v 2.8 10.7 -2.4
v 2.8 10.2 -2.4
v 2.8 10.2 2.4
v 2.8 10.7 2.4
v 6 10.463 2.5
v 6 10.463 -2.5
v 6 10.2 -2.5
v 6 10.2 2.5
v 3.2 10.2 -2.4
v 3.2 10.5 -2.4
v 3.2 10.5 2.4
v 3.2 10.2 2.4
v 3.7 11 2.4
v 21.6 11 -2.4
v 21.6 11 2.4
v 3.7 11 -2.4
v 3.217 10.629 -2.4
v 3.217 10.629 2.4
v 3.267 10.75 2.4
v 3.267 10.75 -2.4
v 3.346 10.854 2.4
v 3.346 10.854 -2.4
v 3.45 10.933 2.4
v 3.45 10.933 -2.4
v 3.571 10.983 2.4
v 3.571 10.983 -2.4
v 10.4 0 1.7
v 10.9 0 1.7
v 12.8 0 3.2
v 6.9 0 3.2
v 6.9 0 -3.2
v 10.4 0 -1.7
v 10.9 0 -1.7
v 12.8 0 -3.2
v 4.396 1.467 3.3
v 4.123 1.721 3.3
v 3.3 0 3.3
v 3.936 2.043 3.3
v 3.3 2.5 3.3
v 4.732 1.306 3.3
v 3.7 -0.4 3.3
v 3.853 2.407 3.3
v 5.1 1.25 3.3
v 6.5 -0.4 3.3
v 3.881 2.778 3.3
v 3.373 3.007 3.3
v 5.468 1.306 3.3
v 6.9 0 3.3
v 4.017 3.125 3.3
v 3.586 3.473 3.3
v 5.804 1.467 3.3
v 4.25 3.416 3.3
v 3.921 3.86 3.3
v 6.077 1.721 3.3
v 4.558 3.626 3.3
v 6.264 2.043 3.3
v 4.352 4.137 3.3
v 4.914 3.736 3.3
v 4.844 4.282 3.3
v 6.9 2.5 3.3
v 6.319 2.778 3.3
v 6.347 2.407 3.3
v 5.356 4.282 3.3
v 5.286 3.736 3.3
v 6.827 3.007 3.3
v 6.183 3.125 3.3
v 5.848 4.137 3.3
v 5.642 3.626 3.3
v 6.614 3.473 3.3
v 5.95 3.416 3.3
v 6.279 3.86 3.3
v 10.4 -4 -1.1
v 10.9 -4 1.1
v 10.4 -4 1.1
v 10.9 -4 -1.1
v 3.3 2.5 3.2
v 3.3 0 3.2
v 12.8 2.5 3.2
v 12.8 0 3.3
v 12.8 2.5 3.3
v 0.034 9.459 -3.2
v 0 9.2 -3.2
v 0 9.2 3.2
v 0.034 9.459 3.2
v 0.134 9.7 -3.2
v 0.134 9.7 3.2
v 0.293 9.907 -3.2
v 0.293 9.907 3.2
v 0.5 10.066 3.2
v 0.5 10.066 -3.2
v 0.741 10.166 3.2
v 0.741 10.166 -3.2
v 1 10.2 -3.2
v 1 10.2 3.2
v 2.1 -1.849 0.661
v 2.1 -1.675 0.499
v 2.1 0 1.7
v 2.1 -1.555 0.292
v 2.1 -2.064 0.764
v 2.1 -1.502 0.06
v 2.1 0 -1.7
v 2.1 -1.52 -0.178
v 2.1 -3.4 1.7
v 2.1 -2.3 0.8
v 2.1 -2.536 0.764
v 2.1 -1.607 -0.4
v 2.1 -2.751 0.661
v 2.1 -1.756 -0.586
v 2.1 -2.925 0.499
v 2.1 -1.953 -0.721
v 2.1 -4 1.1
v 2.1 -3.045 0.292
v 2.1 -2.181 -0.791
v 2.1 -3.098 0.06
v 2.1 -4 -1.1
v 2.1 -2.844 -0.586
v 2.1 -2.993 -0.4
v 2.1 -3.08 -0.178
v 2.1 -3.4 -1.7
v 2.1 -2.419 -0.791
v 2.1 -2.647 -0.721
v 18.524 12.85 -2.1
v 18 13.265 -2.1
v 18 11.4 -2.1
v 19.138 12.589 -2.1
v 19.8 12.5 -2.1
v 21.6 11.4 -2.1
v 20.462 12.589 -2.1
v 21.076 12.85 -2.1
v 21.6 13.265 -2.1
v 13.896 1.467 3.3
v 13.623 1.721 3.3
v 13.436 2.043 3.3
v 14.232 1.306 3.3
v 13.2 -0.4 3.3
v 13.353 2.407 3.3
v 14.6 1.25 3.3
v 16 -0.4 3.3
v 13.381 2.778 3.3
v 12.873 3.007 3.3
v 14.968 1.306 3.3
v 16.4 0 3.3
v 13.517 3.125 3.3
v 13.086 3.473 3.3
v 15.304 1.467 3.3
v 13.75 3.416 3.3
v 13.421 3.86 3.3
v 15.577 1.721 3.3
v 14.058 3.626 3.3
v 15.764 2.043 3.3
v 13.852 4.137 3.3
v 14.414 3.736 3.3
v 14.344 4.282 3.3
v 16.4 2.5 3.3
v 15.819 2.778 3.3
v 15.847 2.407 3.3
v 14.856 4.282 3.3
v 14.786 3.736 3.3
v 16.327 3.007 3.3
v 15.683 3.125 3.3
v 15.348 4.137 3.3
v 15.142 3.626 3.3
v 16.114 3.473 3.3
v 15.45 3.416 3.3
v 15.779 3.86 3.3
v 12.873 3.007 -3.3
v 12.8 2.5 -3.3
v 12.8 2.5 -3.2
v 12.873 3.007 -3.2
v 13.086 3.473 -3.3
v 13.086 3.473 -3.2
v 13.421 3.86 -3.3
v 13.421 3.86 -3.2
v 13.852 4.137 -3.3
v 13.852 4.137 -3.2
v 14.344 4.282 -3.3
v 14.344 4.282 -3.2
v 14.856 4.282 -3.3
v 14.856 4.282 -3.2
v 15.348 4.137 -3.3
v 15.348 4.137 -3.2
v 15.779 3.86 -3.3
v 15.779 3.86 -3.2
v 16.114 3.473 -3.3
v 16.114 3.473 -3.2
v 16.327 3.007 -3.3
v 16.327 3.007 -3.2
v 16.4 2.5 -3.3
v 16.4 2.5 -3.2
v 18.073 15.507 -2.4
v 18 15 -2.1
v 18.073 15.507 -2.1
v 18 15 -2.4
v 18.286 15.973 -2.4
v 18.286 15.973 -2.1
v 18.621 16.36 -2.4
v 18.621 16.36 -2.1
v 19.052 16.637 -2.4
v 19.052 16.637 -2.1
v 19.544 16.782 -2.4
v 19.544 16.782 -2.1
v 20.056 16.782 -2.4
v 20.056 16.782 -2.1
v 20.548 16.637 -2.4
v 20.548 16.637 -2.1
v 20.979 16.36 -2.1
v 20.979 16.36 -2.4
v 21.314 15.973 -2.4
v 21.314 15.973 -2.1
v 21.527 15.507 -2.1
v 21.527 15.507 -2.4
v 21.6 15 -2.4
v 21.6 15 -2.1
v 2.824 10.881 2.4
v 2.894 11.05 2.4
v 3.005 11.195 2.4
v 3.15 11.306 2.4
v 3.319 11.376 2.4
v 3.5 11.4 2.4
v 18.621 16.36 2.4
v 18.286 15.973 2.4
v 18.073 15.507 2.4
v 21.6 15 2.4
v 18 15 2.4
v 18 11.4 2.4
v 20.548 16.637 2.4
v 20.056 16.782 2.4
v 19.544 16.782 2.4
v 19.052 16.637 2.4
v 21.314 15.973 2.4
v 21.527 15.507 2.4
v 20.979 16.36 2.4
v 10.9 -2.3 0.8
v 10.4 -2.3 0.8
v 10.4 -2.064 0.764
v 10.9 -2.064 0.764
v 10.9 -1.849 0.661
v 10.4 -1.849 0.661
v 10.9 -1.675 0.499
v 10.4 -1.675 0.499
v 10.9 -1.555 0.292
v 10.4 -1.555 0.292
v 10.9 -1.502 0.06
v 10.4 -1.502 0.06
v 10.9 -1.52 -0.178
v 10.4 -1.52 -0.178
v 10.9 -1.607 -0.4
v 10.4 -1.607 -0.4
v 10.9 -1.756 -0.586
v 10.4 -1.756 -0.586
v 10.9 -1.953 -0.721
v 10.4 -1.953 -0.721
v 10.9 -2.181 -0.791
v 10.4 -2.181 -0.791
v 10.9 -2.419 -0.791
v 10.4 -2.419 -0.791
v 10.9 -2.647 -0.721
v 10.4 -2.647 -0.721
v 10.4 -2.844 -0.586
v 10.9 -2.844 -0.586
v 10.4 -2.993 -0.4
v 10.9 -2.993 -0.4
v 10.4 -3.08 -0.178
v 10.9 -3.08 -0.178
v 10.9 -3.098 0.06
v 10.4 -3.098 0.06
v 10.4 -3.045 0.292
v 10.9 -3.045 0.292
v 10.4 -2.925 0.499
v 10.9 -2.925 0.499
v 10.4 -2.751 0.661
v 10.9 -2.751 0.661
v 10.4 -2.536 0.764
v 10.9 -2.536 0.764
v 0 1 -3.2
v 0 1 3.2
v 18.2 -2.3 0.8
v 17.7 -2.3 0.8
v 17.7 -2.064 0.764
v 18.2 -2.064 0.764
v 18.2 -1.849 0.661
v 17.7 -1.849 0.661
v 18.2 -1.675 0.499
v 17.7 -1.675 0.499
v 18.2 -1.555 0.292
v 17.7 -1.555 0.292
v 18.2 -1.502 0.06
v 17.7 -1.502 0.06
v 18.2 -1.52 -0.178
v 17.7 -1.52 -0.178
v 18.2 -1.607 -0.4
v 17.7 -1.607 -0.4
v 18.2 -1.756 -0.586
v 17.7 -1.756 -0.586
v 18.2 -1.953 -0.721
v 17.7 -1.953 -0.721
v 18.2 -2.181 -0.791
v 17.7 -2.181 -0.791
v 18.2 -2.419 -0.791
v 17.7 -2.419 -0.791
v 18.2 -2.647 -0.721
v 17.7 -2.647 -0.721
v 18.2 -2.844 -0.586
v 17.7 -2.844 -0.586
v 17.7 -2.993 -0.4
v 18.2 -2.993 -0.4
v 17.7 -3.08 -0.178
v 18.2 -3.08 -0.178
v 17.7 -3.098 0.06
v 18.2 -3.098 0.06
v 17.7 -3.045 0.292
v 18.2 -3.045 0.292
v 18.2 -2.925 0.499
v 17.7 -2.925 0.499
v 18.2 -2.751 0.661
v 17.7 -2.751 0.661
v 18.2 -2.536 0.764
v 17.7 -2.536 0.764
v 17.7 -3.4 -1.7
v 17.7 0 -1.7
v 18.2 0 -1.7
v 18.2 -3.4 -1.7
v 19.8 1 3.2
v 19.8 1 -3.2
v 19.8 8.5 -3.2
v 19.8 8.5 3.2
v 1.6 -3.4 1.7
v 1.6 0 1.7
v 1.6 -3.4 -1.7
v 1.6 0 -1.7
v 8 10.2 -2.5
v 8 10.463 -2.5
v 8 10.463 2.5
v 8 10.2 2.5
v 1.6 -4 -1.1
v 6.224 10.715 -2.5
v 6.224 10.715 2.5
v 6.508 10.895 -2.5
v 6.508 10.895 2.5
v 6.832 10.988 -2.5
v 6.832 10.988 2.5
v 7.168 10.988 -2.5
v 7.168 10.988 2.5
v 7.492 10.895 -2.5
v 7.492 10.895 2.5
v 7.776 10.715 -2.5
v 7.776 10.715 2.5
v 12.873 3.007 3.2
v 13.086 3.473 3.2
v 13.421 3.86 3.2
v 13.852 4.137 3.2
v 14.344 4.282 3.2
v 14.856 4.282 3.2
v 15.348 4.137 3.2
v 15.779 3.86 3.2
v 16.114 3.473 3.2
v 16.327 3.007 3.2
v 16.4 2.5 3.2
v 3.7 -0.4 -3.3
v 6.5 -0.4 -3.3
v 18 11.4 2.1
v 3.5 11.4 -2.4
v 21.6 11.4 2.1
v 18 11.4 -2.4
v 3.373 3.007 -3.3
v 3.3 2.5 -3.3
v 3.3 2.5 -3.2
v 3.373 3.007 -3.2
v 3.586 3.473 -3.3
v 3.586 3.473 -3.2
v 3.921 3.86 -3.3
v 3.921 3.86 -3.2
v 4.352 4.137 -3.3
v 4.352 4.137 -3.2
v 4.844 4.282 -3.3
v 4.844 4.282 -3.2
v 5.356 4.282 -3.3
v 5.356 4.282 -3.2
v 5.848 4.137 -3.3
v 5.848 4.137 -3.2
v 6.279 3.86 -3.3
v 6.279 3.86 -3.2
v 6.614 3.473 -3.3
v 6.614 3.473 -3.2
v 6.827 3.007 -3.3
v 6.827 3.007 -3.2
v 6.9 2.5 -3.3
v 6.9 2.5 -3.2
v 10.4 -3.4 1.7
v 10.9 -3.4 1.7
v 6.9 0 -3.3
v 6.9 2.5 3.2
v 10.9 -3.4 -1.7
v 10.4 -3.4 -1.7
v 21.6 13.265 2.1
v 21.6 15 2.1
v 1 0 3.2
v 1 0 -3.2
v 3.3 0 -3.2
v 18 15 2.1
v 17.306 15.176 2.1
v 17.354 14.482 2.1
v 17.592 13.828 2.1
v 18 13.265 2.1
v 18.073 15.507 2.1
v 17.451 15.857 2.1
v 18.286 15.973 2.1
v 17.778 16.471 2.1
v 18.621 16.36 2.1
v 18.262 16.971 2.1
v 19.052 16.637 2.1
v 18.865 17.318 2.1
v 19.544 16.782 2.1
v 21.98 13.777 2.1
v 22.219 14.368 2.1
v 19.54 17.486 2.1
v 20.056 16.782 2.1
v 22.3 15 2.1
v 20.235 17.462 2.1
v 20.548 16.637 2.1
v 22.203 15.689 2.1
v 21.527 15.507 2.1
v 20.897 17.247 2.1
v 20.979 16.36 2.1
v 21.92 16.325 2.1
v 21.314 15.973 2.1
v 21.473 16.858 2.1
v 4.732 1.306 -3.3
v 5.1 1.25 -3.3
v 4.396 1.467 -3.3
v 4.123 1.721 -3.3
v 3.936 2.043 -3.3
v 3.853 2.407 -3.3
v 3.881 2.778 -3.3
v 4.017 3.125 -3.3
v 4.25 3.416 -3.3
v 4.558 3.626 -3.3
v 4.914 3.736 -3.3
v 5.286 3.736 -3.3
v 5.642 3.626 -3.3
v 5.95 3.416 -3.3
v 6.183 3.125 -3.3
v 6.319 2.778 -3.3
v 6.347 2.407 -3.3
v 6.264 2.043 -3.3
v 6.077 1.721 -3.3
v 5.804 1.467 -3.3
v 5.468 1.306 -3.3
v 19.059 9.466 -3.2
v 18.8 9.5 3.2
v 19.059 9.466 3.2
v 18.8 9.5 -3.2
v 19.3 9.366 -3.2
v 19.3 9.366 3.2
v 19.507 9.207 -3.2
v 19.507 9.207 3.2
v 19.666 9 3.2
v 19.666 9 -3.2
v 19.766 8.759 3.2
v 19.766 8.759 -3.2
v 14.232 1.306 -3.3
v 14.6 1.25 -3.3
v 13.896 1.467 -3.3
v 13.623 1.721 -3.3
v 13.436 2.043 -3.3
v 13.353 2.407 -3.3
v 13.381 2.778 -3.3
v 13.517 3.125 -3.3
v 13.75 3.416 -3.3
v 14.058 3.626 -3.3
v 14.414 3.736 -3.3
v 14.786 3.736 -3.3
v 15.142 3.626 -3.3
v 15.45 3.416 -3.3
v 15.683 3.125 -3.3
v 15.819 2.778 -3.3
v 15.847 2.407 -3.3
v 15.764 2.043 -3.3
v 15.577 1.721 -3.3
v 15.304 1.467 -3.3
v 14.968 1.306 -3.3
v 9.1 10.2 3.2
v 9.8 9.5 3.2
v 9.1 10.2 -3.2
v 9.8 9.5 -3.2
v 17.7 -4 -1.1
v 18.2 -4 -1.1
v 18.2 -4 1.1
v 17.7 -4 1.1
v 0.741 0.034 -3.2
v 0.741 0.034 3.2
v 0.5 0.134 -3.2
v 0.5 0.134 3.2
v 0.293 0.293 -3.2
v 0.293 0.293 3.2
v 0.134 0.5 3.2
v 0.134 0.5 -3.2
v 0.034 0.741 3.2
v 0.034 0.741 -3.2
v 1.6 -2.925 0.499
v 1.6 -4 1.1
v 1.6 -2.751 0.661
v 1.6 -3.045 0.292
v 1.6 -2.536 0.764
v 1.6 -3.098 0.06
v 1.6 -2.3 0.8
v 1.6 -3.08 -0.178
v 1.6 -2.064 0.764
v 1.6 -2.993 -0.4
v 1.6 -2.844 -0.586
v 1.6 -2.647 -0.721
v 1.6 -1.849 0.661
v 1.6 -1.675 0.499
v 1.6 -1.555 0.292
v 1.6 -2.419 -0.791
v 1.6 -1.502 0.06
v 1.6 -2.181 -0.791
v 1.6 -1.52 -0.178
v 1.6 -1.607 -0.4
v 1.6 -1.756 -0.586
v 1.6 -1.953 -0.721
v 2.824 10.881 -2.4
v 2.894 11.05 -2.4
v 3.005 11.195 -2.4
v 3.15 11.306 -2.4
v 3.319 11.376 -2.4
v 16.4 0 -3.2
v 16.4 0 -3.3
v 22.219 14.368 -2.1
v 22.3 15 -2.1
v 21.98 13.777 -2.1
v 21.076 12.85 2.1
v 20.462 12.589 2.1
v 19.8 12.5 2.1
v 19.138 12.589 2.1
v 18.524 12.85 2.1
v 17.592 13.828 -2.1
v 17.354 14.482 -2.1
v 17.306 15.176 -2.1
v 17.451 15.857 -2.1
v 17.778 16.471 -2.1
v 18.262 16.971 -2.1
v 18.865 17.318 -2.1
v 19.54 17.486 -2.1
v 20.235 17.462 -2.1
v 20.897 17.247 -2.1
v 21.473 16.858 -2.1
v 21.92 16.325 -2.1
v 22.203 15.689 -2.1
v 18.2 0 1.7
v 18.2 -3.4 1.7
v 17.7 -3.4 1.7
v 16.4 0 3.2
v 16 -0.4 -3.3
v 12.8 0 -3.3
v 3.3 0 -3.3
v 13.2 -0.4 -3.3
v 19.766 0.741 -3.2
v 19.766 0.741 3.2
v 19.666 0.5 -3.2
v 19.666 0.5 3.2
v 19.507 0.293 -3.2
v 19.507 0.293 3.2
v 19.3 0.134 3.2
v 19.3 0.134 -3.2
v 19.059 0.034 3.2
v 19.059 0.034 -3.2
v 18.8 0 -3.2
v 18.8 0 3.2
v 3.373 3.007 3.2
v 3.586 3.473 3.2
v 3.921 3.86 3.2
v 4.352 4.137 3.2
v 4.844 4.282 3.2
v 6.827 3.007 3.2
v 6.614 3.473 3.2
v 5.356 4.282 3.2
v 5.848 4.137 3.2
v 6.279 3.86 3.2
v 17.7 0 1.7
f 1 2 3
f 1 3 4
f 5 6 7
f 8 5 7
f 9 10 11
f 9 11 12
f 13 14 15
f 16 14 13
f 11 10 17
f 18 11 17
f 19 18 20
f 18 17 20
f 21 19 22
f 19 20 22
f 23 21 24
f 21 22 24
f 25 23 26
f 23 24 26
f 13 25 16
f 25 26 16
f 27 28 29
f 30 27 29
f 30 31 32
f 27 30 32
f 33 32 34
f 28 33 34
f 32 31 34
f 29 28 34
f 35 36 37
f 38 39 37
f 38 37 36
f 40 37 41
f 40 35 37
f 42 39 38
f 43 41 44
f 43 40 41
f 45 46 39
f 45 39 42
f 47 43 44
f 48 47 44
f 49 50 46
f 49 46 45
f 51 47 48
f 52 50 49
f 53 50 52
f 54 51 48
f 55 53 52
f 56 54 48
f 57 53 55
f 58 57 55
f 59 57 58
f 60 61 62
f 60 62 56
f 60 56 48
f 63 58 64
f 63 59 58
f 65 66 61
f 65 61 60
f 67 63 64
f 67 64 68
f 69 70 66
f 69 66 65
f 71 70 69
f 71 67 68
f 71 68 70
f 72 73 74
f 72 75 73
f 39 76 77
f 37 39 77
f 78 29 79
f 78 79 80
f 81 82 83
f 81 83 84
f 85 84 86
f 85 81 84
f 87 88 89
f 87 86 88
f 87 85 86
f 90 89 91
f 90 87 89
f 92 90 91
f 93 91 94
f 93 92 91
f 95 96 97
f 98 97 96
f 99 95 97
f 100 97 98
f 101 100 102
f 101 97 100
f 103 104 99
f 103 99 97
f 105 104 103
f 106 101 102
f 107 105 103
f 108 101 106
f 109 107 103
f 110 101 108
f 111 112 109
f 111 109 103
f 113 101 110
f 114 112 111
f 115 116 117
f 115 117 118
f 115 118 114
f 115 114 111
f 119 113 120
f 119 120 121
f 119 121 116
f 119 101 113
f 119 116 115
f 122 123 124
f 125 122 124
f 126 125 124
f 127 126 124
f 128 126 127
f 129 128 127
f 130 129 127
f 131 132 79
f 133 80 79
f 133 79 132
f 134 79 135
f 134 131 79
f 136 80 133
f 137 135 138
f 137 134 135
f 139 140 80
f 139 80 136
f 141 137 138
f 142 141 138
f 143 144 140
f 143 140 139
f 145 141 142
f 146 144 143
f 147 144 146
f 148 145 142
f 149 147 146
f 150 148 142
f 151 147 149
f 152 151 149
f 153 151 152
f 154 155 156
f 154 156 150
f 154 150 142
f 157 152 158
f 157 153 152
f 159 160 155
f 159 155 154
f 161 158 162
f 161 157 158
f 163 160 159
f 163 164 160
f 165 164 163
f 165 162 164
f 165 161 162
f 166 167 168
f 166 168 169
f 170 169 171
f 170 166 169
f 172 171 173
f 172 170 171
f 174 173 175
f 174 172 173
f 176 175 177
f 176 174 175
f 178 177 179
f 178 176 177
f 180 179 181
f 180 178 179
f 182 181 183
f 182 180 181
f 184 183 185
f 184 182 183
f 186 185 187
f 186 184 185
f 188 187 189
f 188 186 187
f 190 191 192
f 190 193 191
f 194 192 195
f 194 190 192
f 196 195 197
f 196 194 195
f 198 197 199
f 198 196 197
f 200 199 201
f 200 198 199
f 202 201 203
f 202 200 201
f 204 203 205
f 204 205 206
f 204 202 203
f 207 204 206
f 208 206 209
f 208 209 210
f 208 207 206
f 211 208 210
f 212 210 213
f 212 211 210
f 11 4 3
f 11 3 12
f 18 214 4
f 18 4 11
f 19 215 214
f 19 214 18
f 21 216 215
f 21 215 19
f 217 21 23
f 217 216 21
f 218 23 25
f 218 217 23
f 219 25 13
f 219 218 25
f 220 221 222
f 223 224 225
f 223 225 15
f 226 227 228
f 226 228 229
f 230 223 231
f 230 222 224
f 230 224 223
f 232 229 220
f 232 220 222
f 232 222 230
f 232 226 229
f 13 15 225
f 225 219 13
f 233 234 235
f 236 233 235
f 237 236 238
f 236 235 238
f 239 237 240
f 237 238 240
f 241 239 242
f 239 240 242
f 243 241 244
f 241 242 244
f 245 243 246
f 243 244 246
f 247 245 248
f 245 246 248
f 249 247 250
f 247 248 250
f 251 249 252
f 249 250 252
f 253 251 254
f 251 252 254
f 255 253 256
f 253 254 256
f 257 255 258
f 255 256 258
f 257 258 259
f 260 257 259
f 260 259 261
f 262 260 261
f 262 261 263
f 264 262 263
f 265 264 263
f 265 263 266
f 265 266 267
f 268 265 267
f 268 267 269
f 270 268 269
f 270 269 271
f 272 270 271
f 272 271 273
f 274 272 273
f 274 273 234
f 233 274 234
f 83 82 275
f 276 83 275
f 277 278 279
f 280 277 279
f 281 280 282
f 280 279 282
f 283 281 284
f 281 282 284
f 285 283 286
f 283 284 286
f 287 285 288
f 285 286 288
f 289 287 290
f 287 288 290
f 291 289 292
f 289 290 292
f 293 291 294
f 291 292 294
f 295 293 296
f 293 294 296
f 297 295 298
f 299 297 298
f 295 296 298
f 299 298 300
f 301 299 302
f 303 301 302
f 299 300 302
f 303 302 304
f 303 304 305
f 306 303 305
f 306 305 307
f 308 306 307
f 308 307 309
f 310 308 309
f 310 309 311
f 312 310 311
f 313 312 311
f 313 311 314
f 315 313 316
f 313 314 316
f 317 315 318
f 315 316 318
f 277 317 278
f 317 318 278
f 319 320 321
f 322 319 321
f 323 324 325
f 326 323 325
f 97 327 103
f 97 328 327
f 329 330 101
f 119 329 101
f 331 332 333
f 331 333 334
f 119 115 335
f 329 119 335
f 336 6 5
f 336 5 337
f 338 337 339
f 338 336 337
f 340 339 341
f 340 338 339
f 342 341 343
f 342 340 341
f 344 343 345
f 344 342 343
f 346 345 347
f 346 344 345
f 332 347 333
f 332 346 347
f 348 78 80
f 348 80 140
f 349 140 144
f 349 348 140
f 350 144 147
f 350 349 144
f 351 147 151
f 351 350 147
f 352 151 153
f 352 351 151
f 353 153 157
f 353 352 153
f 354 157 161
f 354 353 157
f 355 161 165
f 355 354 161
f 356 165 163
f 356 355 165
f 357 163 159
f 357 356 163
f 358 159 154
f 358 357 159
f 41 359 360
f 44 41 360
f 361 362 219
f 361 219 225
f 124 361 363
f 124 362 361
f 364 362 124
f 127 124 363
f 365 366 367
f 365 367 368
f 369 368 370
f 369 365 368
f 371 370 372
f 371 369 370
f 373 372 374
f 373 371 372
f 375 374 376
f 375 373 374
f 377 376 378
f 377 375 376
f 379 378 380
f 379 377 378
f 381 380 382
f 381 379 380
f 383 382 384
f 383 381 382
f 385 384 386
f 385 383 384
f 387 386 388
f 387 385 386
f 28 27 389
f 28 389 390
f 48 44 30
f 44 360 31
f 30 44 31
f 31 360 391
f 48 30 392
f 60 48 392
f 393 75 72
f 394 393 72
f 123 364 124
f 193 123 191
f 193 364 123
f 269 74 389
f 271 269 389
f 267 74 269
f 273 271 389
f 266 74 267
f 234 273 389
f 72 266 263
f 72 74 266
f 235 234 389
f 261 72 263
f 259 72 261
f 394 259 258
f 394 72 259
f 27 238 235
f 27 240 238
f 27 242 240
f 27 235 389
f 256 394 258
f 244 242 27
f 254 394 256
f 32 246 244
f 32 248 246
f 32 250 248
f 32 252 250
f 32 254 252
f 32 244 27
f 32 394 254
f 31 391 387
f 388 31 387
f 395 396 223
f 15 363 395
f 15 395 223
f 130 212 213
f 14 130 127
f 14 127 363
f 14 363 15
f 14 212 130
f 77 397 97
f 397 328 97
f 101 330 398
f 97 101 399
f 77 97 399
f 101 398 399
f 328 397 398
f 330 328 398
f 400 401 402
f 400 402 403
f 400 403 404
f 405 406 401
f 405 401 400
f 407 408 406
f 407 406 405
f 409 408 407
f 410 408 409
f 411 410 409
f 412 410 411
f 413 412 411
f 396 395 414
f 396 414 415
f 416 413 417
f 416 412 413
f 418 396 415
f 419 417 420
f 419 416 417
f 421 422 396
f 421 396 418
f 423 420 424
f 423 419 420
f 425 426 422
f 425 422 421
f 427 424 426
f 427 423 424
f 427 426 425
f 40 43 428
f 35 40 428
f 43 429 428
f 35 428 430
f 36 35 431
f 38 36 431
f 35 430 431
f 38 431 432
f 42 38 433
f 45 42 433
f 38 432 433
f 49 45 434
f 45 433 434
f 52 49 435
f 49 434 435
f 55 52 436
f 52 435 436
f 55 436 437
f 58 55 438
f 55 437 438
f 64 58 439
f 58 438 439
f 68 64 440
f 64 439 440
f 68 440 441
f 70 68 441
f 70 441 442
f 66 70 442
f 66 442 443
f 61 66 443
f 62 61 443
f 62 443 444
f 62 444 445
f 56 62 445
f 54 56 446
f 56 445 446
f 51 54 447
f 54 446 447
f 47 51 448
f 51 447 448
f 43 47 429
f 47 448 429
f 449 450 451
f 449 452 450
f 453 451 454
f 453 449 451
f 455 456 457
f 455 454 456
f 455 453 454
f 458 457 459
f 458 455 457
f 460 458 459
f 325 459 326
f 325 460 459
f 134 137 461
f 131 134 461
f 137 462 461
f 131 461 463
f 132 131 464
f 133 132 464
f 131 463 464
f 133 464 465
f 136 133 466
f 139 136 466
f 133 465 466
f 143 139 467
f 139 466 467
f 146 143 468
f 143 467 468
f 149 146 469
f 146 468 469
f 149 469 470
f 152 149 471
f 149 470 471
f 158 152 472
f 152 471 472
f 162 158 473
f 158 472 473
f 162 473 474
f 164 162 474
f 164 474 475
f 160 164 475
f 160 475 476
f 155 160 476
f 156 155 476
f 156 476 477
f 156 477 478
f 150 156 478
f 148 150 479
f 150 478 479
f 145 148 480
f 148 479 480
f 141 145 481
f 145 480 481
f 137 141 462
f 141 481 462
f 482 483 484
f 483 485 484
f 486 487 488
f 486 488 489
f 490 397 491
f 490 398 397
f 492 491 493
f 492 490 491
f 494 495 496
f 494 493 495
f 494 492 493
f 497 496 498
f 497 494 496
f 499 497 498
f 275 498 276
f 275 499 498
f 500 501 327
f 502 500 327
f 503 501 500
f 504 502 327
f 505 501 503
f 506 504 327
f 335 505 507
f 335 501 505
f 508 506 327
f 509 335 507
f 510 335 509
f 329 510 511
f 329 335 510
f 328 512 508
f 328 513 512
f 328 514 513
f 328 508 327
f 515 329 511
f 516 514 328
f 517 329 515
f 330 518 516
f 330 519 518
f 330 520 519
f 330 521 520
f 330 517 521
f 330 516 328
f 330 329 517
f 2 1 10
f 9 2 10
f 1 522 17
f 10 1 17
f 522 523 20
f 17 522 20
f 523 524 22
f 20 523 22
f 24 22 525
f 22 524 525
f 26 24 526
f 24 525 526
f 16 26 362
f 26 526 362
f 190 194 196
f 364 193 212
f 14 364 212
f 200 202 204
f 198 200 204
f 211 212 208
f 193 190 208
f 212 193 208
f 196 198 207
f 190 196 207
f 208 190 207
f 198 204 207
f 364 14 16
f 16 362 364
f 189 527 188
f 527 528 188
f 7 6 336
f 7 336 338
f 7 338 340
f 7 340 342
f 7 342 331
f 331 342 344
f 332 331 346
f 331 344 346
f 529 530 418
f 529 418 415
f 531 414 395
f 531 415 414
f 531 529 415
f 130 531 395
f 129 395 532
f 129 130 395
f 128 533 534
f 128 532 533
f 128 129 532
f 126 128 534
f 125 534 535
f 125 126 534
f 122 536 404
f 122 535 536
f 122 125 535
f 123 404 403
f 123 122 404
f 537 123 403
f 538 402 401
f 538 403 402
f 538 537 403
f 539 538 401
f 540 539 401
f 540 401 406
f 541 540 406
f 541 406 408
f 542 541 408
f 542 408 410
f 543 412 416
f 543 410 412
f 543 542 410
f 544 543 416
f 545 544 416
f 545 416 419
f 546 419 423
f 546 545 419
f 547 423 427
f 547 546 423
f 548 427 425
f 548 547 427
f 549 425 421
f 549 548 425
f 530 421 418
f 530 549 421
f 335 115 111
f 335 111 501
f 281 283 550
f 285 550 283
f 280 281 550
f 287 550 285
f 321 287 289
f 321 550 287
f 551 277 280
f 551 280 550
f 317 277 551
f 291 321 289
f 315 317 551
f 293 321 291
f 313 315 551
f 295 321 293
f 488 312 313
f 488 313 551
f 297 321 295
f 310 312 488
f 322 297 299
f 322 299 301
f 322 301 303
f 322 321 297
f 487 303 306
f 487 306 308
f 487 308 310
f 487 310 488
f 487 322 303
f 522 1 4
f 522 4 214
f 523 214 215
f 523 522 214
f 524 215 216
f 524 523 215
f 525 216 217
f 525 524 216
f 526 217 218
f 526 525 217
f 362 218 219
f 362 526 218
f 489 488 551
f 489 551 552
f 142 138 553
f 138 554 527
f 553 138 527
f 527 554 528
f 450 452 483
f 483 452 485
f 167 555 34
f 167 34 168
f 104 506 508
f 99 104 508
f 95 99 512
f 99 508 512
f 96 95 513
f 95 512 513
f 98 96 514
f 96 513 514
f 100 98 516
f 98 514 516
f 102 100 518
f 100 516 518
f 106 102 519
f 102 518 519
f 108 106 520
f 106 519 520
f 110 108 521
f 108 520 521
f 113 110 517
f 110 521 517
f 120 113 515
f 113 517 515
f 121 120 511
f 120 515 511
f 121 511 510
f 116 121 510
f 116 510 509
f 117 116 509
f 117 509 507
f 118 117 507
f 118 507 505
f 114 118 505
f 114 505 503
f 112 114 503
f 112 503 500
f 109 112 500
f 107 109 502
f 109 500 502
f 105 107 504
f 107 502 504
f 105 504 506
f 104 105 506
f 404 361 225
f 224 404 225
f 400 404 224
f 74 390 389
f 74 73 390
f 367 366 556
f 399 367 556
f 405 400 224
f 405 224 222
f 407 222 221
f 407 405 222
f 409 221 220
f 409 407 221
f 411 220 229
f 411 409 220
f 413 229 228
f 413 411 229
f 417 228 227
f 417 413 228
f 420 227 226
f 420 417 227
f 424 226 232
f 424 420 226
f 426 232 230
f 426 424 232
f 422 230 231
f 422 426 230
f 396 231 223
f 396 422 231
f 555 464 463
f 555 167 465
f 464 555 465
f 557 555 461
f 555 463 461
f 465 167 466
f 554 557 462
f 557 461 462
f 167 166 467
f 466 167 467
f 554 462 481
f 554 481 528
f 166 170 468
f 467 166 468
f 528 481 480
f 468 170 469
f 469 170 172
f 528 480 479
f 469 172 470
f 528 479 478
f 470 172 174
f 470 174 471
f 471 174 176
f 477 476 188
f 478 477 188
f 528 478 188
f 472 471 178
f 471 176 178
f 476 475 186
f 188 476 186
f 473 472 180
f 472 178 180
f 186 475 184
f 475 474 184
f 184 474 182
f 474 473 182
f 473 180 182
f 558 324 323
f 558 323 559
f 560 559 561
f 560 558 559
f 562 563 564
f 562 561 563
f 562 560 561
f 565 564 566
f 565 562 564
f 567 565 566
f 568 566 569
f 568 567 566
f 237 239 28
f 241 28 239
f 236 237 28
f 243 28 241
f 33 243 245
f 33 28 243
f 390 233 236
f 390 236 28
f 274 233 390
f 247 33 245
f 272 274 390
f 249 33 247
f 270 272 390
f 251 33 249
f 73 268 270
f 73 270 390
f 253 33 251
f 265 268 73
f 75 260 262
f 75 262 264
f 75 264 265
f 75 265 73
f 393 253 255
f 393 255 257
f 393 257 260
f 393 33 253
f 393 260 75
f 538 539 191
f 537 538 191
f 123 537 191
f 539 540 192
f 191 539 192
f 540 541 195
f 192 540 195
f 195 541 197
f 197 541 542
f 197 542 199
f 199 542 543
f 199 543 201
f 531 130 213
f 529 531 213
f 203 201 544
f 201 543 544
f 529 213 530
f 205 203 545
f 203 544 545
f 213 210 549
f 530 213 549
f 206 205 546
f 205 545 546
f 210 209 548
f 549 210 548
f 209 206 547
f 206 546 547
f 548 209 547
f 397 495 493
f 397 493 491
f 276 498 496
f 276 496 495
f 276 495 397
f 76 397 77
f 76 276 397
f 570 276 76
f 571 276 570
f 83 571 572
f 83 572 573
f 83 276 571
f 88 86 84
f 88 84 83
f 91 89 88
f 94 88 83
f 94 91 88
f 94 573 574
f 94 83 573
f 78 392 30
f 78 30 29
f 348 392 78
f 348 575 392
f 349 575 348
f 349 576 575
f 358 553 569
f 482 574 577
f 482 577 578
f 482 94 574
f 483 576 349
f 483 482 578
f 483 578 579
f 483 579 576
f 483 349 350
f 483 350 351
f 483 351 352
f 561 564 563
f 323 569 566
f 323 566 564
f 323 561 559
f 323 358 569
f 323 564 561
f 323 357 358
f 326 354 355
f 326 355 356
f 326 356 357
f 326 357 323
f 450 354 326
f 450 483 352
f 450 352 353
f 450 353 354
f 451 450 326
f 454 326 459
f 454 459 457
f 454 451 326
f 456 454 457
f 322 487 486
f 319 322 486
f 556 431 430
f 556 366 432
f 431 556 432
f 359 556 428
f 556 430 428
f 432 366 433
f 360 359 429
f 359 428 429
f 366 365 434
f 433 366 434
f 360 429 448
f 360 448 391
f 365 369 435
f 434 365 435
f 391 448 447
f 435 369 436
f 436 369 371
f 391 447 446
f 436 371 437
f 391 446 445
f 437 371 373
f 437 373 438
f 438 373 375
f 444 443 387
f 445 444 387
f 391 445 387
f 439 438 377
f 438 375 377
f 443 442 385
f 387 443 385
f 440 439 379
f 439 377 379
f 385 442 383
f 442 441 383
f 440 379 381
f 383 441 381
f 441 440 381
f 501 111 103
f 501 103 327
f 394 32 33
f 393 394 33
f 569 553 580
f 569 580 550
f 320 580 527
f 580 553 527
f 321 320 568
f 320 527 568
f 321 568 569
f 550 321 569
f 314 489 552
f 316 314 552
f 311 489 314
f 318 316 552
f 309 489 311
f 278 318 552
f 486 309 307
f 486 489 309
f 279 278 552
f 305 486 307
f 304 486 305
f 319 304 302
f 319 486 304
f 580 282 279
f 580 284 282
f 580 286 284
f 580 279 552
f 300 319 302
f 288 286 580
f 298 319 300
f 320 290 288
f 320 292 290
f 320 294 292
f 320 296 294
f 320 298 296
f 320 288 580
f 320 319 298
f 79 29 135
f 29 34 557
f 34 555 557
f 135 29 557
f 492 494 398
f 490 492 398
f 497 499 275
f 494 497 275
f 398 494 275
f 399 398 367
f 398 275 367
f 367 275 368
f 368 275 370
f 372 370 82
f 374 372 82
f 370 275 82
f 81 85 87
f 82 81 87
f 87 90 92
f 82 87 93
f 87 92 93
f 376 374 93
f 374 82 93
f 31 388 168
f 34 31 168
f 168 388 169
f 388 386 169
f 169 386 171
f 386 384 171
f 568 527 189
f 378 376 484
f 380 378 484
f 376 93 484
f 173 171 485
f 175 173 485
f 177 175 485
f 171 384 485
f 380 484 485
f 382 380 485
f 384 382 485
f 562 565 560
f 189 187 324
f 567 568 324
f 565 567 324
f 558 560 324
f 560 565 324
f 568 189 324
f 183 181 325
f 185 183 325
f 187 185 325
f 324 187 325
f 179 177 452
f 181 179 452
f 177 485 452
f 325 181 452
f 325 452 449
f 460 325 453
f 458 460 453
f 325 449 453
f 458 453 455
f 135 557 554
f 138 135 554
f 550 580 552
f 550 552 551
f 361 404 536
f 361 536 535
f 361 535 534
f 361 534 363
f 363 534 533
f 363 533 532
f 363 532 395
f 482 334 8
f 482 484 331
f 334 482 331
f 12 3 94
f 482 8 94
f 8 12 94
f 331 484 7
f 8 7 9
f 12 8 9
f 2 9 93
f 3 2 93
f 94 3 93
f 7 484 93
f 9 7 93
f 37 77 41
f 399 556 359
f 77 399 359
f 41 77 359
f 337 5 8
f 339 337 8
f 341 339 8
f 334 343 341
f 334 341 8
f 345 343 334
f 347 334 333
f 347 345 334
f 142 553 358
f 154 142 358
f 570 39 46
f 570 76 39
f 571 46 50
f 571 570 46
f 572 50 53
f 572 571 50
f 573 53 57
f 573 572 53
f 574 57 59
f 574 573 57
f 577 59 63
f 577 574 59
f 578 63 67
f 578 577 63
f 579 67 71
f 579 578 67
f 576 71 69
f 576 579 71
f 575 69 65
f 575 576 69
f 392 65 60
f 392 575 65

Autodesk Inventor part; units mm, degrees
ref_plane "YZ Plane" through (0, 0, 0) normal (1, 0, 0) x (0, 1, 0)
ref_plane "XZ Plane" through (0, 0, 0) normal (0, 1, 0) x (-1, 0, 0)
ref_plane "XY Plane" through (0, 0, 0) normal (0, 0, 1) x (1, 0, 0)
sketch "Эскиз2" plane through (0, 0, 0) normal (0, 0, 1) x (1, 0, 0)
  line L0 (1, 0) -> (18.8, 0)
  line L1 (19.8, 1) -> (19.8, 8.5)
  line L2 (18.8, 9.5) -> (9.8, 9.5)
  line L3 (9.8, 9.5) -> (9.1, 10.2)
  line L4 (9.1, 10.2) -> (1, 10.2)
  line L5 (0, 9.2) -> (0, 1)
  arc A0 (1, 10.2) -> (0, 9.2) centre (1, 9.2) ccw
  arc A1 (0, 1) -> (1, 0) centre (1, 1) ccw
  arc A2 (18.8, 0) -> (19.8, 1) centre (18.8, 1) ccw
  arc A3 (19.8, 8.5) -> (18.8, 9.5) centre (18.8, 8.5) ccw
  point P0 (0, 0)
  point P1 (19.8, 0)
  point P2 (19.8, 9.5)
  dimension "d42" = 19.8
  dimension "d43" = 9.5
  dimension "d44" = 10
  dimension "d45" = 135
  dimension "d46" = 10.2
  dimension "d47" = 1
extrude "Выдавливание1" add sketch "Эскиз2" along normal mid plane 6.4
sketch "Эскиз3" plane through (0, 0, 0) normal (0, 0, 1) x (1, 0, 0)
  line L0 (1, 0) -> (18.8, 0) projected
  line L1 (1.6, 0) -> (2.1, 0)
  line L2 (2.1, 0) -> (2.1, -4)
  line L3 (2.1, -4) -> (1.6, -4)
  line L4 (1.6, -4) -> (1.6, 0)
  line L5 (10.4, 0) -> (10.9, 0)
  line L6 (10.9, 0) -> (10.9, -4)
  line L7 (10.9, -4) -> (10.4, -4)
  line L8 (10.4, -4) -> (10.4, 0)
  line L9 (17.7, 0) -> (18.2, 0)
  line L10 (18.2, 0) -> (18.2, -4)
  line L11 (18.2, -4) -> (17.7, -4)
  line L12 (17.7, -4) -> (17.7, 0)
  line L13 (0, 9.2) -> (0, 1) projected
  point P0 (0, 0)
  point P1 (1.85, -4)
  point P2 (17.95, -4)
  point P3 (10.65, -4)
  dimension "d51" = 0.5
  dimension "d52" = 8.8
  dimension "d53" = 7.3
  dimension "d54" = 4
  dimension "d55" = 1.85
extrude "Выдавливание2" add sketch "Эскиз3" along normal mid plane 3.4
sketch "Эскиз4" plane through (0, 0, 0) normal (0, 0, 1) x (1, 0, 0)
  arc A0 (6.9, 2.5) -> (3.3, 2.5) centre (5.1, 2.5) ccw
  line L0 (3.3, 2.5) -> (3.3, 0)
  line L1 (18.8, 0) -> (1, 0) projected
  line L2 (3.3, 0) -> (3.7, -0.4)
  line L3 (3.7, -0.4) -> (6.5, -0.4)
  line L4 (6.5, -0.4) -> (6.9, 0)
  line L5 (6.9, 0) -> (6.9, 2.5)
  line L6 (12.8, 0) -> (13.2, -0.4)
  line L7 (13.2, -0.4) -> (16, -0.4)
  line L8 (16, -0.4) -> (16.4, 0)
  line L9 (16.4, 0) -> (16.4, 2.5)
  line L10 (12.8, 0) -> (12.8, 2.5)
  arc A1 (16.4, 2.5) -> (12.8, 2.5) centre (14.6, 2.5) ccw
  line L11 (0, 1) -> (0, 9.2) projected
  point P0 (0, 0)
  dimension "d58" = 0.4
  dimension "d59" = 2.5
  dimension "d60" = 1.8
  dimension "d61" = 135
  dimension "d62" = 9.5
  dimension "d63" = 5.1
extrude "Выдавливание3" add sketch "Эскиз4" along normal mid plane 6.6
sketch "Эскиз6" plane through (0, 0, 3.3) normal (0, 0, 1) x (1, 0, 0)
  arc A0 (6.9, 2.5) -> (3.3, 2.5) centre (5.1, 2.5) ccw projected
  arc A1 (16.4, 2.5) -> (12.8, 2.5) centre (14.6, 2.5) ccw projected
  point P0 (0, 0)
hole "Отверстие1" at (5.1, 2.5, 3.3) at (14.6, 2.5, 3.3) direction (0, 0, -1) diameter 2.5 end through all
sketch "Эскиз7" plane through (0, 0, 0) normal (0, 0, 1) x (1, 0, 0)
  line L0 (1, 10.2) -> (9.1, 10.2) projected
  line L1 (2.8, 10.2) -> (2.8, 10.7)
  line L2 (3.5, 11.4) -> (18, 11.4)
  line L3 (18, 11.4) -> (18, 15)
  line L4 (21.6, 15) -> (21.6, 11)
  line L5 (21.6, 11) -> (3.7, 11)
  line L6 (3.2, 10.5) -> (3.2, 10.2)
  arc A0 (21.6, 15) -> (18, 15) centre (19.8, 15) ccw
  line L7 (0, 9.2) -> (0, 1) projected
  arc A1 (3.7, 11) -> (3.2, 10.5) centre (3.7, 10.5) ccw
  arc A2 (3.5, 11.4) -> (2.8, 10.7) centre (3.5, 10.7) ccw
  point P0 (0, 0)
  point P1 (2.8, 11.4)
  point P2 (3.2, 11)
  dimension "d73" = 0.4
  dimension "d74" = 2.8
  dimension "d75" = 17
  dimension "d76" = 1.8
  dimension "d77" = 0.4
  dimension "d78" = 0.8
  dimension "d79" = 4
  dimension "d82" = 0.5
  dimension "d83" = 0.7
extrude "Выдавливание4" add sketch "Эскиз7" along normal mid plane 4.8
sketch "Эскиз8" plane through (0, 0, 0) normal (0, 0, 1) x (1, 0, 0)
  line L0 (3.5, 11.4) -> (18, 11.4) projected
  line L1 (9.8542, 11.4) -> (26.7526, 11.4)
  line L2 (26.7526, 11.4) -> (26.7526, 19.641)
  line L3 (26.7526, 19.641) -> (9.8542, 19.641)
  line L4 (9.8542, 19.641) -> (9.8542, 11.4)
  point P0 (0, 0)
  point P1 (19.8, 15)
extrude "Выдавливание5" cut sketch "Эскиз8" along normal mid plane 4.2
sketch "Эскиз9" plane through (0, 0, 0) normal (0, 0, 1) x (1, 0, 0)
  arc A0 (21.6, 15) -> (18, 15) centre (19.8, 15) ccw projected
  circle A1 centre (19.8, 15) radius 2.5
  point P0 (0, 0)
  dimension "d87" = 5
extrude "Выдавливание6" add sketch "Эскиз9" along normal mid plane 4.2
sketch "Эскиз10" plane through (1.6, -4, 1.7) normal (-1, 0, 0) x (0, 0, 1)
  circle A0 centre (-1.7, 1.7) radius 0.8
  line L0 (-3.4, 0) -> (0, 0) projected
  point P0 (-1.7, 4)
  dimension "d90" = 1.6
  dimension "d91" = 1.7
extrude "Выдавливание7" cut sketch "Эскиз10" against normal through all
chamfer "Фаска1" distance 0.6 angle 45 6 edges at (1.85, -4, -1.7) (10.65, -4, -1.7) (17.95, -4, -1.7) (10.65, -4, 1.7) (1.85, -4, 1.7) (17.95, -4, 1.7)
sketch "Эскиз11" plane through (0, 0, 0) normal (0, 0, 1) x (1, 0, 0)
  arc A0 (8, 10.4633) -> (6, 10.4633) centre (7, 9.8) ccw
  line L0 (6, 10.4633) -> (6, 10.2)
  line L1 (6, 10.2) -> (8, 10.2)
  line L2 (9.1, 10.2) -> (1, 10.2) projected
  line L3 (8, 10.4633) -> (8, 10.2)
  line L4 (3.7, 11) -> (21.6, 11) projected
  line L5 (0, 9.2) -> (0, 1) projected
  point P0 (0, 0)
  dimension "d97" = 1.2
  dimension "d98" = 2
  dimension "d99" = 6
extrude "Выдавливание8" add sketch "Эскиз11" along normal mid plane 5
properties part number "MSW-13" material "Пластик АБС"
